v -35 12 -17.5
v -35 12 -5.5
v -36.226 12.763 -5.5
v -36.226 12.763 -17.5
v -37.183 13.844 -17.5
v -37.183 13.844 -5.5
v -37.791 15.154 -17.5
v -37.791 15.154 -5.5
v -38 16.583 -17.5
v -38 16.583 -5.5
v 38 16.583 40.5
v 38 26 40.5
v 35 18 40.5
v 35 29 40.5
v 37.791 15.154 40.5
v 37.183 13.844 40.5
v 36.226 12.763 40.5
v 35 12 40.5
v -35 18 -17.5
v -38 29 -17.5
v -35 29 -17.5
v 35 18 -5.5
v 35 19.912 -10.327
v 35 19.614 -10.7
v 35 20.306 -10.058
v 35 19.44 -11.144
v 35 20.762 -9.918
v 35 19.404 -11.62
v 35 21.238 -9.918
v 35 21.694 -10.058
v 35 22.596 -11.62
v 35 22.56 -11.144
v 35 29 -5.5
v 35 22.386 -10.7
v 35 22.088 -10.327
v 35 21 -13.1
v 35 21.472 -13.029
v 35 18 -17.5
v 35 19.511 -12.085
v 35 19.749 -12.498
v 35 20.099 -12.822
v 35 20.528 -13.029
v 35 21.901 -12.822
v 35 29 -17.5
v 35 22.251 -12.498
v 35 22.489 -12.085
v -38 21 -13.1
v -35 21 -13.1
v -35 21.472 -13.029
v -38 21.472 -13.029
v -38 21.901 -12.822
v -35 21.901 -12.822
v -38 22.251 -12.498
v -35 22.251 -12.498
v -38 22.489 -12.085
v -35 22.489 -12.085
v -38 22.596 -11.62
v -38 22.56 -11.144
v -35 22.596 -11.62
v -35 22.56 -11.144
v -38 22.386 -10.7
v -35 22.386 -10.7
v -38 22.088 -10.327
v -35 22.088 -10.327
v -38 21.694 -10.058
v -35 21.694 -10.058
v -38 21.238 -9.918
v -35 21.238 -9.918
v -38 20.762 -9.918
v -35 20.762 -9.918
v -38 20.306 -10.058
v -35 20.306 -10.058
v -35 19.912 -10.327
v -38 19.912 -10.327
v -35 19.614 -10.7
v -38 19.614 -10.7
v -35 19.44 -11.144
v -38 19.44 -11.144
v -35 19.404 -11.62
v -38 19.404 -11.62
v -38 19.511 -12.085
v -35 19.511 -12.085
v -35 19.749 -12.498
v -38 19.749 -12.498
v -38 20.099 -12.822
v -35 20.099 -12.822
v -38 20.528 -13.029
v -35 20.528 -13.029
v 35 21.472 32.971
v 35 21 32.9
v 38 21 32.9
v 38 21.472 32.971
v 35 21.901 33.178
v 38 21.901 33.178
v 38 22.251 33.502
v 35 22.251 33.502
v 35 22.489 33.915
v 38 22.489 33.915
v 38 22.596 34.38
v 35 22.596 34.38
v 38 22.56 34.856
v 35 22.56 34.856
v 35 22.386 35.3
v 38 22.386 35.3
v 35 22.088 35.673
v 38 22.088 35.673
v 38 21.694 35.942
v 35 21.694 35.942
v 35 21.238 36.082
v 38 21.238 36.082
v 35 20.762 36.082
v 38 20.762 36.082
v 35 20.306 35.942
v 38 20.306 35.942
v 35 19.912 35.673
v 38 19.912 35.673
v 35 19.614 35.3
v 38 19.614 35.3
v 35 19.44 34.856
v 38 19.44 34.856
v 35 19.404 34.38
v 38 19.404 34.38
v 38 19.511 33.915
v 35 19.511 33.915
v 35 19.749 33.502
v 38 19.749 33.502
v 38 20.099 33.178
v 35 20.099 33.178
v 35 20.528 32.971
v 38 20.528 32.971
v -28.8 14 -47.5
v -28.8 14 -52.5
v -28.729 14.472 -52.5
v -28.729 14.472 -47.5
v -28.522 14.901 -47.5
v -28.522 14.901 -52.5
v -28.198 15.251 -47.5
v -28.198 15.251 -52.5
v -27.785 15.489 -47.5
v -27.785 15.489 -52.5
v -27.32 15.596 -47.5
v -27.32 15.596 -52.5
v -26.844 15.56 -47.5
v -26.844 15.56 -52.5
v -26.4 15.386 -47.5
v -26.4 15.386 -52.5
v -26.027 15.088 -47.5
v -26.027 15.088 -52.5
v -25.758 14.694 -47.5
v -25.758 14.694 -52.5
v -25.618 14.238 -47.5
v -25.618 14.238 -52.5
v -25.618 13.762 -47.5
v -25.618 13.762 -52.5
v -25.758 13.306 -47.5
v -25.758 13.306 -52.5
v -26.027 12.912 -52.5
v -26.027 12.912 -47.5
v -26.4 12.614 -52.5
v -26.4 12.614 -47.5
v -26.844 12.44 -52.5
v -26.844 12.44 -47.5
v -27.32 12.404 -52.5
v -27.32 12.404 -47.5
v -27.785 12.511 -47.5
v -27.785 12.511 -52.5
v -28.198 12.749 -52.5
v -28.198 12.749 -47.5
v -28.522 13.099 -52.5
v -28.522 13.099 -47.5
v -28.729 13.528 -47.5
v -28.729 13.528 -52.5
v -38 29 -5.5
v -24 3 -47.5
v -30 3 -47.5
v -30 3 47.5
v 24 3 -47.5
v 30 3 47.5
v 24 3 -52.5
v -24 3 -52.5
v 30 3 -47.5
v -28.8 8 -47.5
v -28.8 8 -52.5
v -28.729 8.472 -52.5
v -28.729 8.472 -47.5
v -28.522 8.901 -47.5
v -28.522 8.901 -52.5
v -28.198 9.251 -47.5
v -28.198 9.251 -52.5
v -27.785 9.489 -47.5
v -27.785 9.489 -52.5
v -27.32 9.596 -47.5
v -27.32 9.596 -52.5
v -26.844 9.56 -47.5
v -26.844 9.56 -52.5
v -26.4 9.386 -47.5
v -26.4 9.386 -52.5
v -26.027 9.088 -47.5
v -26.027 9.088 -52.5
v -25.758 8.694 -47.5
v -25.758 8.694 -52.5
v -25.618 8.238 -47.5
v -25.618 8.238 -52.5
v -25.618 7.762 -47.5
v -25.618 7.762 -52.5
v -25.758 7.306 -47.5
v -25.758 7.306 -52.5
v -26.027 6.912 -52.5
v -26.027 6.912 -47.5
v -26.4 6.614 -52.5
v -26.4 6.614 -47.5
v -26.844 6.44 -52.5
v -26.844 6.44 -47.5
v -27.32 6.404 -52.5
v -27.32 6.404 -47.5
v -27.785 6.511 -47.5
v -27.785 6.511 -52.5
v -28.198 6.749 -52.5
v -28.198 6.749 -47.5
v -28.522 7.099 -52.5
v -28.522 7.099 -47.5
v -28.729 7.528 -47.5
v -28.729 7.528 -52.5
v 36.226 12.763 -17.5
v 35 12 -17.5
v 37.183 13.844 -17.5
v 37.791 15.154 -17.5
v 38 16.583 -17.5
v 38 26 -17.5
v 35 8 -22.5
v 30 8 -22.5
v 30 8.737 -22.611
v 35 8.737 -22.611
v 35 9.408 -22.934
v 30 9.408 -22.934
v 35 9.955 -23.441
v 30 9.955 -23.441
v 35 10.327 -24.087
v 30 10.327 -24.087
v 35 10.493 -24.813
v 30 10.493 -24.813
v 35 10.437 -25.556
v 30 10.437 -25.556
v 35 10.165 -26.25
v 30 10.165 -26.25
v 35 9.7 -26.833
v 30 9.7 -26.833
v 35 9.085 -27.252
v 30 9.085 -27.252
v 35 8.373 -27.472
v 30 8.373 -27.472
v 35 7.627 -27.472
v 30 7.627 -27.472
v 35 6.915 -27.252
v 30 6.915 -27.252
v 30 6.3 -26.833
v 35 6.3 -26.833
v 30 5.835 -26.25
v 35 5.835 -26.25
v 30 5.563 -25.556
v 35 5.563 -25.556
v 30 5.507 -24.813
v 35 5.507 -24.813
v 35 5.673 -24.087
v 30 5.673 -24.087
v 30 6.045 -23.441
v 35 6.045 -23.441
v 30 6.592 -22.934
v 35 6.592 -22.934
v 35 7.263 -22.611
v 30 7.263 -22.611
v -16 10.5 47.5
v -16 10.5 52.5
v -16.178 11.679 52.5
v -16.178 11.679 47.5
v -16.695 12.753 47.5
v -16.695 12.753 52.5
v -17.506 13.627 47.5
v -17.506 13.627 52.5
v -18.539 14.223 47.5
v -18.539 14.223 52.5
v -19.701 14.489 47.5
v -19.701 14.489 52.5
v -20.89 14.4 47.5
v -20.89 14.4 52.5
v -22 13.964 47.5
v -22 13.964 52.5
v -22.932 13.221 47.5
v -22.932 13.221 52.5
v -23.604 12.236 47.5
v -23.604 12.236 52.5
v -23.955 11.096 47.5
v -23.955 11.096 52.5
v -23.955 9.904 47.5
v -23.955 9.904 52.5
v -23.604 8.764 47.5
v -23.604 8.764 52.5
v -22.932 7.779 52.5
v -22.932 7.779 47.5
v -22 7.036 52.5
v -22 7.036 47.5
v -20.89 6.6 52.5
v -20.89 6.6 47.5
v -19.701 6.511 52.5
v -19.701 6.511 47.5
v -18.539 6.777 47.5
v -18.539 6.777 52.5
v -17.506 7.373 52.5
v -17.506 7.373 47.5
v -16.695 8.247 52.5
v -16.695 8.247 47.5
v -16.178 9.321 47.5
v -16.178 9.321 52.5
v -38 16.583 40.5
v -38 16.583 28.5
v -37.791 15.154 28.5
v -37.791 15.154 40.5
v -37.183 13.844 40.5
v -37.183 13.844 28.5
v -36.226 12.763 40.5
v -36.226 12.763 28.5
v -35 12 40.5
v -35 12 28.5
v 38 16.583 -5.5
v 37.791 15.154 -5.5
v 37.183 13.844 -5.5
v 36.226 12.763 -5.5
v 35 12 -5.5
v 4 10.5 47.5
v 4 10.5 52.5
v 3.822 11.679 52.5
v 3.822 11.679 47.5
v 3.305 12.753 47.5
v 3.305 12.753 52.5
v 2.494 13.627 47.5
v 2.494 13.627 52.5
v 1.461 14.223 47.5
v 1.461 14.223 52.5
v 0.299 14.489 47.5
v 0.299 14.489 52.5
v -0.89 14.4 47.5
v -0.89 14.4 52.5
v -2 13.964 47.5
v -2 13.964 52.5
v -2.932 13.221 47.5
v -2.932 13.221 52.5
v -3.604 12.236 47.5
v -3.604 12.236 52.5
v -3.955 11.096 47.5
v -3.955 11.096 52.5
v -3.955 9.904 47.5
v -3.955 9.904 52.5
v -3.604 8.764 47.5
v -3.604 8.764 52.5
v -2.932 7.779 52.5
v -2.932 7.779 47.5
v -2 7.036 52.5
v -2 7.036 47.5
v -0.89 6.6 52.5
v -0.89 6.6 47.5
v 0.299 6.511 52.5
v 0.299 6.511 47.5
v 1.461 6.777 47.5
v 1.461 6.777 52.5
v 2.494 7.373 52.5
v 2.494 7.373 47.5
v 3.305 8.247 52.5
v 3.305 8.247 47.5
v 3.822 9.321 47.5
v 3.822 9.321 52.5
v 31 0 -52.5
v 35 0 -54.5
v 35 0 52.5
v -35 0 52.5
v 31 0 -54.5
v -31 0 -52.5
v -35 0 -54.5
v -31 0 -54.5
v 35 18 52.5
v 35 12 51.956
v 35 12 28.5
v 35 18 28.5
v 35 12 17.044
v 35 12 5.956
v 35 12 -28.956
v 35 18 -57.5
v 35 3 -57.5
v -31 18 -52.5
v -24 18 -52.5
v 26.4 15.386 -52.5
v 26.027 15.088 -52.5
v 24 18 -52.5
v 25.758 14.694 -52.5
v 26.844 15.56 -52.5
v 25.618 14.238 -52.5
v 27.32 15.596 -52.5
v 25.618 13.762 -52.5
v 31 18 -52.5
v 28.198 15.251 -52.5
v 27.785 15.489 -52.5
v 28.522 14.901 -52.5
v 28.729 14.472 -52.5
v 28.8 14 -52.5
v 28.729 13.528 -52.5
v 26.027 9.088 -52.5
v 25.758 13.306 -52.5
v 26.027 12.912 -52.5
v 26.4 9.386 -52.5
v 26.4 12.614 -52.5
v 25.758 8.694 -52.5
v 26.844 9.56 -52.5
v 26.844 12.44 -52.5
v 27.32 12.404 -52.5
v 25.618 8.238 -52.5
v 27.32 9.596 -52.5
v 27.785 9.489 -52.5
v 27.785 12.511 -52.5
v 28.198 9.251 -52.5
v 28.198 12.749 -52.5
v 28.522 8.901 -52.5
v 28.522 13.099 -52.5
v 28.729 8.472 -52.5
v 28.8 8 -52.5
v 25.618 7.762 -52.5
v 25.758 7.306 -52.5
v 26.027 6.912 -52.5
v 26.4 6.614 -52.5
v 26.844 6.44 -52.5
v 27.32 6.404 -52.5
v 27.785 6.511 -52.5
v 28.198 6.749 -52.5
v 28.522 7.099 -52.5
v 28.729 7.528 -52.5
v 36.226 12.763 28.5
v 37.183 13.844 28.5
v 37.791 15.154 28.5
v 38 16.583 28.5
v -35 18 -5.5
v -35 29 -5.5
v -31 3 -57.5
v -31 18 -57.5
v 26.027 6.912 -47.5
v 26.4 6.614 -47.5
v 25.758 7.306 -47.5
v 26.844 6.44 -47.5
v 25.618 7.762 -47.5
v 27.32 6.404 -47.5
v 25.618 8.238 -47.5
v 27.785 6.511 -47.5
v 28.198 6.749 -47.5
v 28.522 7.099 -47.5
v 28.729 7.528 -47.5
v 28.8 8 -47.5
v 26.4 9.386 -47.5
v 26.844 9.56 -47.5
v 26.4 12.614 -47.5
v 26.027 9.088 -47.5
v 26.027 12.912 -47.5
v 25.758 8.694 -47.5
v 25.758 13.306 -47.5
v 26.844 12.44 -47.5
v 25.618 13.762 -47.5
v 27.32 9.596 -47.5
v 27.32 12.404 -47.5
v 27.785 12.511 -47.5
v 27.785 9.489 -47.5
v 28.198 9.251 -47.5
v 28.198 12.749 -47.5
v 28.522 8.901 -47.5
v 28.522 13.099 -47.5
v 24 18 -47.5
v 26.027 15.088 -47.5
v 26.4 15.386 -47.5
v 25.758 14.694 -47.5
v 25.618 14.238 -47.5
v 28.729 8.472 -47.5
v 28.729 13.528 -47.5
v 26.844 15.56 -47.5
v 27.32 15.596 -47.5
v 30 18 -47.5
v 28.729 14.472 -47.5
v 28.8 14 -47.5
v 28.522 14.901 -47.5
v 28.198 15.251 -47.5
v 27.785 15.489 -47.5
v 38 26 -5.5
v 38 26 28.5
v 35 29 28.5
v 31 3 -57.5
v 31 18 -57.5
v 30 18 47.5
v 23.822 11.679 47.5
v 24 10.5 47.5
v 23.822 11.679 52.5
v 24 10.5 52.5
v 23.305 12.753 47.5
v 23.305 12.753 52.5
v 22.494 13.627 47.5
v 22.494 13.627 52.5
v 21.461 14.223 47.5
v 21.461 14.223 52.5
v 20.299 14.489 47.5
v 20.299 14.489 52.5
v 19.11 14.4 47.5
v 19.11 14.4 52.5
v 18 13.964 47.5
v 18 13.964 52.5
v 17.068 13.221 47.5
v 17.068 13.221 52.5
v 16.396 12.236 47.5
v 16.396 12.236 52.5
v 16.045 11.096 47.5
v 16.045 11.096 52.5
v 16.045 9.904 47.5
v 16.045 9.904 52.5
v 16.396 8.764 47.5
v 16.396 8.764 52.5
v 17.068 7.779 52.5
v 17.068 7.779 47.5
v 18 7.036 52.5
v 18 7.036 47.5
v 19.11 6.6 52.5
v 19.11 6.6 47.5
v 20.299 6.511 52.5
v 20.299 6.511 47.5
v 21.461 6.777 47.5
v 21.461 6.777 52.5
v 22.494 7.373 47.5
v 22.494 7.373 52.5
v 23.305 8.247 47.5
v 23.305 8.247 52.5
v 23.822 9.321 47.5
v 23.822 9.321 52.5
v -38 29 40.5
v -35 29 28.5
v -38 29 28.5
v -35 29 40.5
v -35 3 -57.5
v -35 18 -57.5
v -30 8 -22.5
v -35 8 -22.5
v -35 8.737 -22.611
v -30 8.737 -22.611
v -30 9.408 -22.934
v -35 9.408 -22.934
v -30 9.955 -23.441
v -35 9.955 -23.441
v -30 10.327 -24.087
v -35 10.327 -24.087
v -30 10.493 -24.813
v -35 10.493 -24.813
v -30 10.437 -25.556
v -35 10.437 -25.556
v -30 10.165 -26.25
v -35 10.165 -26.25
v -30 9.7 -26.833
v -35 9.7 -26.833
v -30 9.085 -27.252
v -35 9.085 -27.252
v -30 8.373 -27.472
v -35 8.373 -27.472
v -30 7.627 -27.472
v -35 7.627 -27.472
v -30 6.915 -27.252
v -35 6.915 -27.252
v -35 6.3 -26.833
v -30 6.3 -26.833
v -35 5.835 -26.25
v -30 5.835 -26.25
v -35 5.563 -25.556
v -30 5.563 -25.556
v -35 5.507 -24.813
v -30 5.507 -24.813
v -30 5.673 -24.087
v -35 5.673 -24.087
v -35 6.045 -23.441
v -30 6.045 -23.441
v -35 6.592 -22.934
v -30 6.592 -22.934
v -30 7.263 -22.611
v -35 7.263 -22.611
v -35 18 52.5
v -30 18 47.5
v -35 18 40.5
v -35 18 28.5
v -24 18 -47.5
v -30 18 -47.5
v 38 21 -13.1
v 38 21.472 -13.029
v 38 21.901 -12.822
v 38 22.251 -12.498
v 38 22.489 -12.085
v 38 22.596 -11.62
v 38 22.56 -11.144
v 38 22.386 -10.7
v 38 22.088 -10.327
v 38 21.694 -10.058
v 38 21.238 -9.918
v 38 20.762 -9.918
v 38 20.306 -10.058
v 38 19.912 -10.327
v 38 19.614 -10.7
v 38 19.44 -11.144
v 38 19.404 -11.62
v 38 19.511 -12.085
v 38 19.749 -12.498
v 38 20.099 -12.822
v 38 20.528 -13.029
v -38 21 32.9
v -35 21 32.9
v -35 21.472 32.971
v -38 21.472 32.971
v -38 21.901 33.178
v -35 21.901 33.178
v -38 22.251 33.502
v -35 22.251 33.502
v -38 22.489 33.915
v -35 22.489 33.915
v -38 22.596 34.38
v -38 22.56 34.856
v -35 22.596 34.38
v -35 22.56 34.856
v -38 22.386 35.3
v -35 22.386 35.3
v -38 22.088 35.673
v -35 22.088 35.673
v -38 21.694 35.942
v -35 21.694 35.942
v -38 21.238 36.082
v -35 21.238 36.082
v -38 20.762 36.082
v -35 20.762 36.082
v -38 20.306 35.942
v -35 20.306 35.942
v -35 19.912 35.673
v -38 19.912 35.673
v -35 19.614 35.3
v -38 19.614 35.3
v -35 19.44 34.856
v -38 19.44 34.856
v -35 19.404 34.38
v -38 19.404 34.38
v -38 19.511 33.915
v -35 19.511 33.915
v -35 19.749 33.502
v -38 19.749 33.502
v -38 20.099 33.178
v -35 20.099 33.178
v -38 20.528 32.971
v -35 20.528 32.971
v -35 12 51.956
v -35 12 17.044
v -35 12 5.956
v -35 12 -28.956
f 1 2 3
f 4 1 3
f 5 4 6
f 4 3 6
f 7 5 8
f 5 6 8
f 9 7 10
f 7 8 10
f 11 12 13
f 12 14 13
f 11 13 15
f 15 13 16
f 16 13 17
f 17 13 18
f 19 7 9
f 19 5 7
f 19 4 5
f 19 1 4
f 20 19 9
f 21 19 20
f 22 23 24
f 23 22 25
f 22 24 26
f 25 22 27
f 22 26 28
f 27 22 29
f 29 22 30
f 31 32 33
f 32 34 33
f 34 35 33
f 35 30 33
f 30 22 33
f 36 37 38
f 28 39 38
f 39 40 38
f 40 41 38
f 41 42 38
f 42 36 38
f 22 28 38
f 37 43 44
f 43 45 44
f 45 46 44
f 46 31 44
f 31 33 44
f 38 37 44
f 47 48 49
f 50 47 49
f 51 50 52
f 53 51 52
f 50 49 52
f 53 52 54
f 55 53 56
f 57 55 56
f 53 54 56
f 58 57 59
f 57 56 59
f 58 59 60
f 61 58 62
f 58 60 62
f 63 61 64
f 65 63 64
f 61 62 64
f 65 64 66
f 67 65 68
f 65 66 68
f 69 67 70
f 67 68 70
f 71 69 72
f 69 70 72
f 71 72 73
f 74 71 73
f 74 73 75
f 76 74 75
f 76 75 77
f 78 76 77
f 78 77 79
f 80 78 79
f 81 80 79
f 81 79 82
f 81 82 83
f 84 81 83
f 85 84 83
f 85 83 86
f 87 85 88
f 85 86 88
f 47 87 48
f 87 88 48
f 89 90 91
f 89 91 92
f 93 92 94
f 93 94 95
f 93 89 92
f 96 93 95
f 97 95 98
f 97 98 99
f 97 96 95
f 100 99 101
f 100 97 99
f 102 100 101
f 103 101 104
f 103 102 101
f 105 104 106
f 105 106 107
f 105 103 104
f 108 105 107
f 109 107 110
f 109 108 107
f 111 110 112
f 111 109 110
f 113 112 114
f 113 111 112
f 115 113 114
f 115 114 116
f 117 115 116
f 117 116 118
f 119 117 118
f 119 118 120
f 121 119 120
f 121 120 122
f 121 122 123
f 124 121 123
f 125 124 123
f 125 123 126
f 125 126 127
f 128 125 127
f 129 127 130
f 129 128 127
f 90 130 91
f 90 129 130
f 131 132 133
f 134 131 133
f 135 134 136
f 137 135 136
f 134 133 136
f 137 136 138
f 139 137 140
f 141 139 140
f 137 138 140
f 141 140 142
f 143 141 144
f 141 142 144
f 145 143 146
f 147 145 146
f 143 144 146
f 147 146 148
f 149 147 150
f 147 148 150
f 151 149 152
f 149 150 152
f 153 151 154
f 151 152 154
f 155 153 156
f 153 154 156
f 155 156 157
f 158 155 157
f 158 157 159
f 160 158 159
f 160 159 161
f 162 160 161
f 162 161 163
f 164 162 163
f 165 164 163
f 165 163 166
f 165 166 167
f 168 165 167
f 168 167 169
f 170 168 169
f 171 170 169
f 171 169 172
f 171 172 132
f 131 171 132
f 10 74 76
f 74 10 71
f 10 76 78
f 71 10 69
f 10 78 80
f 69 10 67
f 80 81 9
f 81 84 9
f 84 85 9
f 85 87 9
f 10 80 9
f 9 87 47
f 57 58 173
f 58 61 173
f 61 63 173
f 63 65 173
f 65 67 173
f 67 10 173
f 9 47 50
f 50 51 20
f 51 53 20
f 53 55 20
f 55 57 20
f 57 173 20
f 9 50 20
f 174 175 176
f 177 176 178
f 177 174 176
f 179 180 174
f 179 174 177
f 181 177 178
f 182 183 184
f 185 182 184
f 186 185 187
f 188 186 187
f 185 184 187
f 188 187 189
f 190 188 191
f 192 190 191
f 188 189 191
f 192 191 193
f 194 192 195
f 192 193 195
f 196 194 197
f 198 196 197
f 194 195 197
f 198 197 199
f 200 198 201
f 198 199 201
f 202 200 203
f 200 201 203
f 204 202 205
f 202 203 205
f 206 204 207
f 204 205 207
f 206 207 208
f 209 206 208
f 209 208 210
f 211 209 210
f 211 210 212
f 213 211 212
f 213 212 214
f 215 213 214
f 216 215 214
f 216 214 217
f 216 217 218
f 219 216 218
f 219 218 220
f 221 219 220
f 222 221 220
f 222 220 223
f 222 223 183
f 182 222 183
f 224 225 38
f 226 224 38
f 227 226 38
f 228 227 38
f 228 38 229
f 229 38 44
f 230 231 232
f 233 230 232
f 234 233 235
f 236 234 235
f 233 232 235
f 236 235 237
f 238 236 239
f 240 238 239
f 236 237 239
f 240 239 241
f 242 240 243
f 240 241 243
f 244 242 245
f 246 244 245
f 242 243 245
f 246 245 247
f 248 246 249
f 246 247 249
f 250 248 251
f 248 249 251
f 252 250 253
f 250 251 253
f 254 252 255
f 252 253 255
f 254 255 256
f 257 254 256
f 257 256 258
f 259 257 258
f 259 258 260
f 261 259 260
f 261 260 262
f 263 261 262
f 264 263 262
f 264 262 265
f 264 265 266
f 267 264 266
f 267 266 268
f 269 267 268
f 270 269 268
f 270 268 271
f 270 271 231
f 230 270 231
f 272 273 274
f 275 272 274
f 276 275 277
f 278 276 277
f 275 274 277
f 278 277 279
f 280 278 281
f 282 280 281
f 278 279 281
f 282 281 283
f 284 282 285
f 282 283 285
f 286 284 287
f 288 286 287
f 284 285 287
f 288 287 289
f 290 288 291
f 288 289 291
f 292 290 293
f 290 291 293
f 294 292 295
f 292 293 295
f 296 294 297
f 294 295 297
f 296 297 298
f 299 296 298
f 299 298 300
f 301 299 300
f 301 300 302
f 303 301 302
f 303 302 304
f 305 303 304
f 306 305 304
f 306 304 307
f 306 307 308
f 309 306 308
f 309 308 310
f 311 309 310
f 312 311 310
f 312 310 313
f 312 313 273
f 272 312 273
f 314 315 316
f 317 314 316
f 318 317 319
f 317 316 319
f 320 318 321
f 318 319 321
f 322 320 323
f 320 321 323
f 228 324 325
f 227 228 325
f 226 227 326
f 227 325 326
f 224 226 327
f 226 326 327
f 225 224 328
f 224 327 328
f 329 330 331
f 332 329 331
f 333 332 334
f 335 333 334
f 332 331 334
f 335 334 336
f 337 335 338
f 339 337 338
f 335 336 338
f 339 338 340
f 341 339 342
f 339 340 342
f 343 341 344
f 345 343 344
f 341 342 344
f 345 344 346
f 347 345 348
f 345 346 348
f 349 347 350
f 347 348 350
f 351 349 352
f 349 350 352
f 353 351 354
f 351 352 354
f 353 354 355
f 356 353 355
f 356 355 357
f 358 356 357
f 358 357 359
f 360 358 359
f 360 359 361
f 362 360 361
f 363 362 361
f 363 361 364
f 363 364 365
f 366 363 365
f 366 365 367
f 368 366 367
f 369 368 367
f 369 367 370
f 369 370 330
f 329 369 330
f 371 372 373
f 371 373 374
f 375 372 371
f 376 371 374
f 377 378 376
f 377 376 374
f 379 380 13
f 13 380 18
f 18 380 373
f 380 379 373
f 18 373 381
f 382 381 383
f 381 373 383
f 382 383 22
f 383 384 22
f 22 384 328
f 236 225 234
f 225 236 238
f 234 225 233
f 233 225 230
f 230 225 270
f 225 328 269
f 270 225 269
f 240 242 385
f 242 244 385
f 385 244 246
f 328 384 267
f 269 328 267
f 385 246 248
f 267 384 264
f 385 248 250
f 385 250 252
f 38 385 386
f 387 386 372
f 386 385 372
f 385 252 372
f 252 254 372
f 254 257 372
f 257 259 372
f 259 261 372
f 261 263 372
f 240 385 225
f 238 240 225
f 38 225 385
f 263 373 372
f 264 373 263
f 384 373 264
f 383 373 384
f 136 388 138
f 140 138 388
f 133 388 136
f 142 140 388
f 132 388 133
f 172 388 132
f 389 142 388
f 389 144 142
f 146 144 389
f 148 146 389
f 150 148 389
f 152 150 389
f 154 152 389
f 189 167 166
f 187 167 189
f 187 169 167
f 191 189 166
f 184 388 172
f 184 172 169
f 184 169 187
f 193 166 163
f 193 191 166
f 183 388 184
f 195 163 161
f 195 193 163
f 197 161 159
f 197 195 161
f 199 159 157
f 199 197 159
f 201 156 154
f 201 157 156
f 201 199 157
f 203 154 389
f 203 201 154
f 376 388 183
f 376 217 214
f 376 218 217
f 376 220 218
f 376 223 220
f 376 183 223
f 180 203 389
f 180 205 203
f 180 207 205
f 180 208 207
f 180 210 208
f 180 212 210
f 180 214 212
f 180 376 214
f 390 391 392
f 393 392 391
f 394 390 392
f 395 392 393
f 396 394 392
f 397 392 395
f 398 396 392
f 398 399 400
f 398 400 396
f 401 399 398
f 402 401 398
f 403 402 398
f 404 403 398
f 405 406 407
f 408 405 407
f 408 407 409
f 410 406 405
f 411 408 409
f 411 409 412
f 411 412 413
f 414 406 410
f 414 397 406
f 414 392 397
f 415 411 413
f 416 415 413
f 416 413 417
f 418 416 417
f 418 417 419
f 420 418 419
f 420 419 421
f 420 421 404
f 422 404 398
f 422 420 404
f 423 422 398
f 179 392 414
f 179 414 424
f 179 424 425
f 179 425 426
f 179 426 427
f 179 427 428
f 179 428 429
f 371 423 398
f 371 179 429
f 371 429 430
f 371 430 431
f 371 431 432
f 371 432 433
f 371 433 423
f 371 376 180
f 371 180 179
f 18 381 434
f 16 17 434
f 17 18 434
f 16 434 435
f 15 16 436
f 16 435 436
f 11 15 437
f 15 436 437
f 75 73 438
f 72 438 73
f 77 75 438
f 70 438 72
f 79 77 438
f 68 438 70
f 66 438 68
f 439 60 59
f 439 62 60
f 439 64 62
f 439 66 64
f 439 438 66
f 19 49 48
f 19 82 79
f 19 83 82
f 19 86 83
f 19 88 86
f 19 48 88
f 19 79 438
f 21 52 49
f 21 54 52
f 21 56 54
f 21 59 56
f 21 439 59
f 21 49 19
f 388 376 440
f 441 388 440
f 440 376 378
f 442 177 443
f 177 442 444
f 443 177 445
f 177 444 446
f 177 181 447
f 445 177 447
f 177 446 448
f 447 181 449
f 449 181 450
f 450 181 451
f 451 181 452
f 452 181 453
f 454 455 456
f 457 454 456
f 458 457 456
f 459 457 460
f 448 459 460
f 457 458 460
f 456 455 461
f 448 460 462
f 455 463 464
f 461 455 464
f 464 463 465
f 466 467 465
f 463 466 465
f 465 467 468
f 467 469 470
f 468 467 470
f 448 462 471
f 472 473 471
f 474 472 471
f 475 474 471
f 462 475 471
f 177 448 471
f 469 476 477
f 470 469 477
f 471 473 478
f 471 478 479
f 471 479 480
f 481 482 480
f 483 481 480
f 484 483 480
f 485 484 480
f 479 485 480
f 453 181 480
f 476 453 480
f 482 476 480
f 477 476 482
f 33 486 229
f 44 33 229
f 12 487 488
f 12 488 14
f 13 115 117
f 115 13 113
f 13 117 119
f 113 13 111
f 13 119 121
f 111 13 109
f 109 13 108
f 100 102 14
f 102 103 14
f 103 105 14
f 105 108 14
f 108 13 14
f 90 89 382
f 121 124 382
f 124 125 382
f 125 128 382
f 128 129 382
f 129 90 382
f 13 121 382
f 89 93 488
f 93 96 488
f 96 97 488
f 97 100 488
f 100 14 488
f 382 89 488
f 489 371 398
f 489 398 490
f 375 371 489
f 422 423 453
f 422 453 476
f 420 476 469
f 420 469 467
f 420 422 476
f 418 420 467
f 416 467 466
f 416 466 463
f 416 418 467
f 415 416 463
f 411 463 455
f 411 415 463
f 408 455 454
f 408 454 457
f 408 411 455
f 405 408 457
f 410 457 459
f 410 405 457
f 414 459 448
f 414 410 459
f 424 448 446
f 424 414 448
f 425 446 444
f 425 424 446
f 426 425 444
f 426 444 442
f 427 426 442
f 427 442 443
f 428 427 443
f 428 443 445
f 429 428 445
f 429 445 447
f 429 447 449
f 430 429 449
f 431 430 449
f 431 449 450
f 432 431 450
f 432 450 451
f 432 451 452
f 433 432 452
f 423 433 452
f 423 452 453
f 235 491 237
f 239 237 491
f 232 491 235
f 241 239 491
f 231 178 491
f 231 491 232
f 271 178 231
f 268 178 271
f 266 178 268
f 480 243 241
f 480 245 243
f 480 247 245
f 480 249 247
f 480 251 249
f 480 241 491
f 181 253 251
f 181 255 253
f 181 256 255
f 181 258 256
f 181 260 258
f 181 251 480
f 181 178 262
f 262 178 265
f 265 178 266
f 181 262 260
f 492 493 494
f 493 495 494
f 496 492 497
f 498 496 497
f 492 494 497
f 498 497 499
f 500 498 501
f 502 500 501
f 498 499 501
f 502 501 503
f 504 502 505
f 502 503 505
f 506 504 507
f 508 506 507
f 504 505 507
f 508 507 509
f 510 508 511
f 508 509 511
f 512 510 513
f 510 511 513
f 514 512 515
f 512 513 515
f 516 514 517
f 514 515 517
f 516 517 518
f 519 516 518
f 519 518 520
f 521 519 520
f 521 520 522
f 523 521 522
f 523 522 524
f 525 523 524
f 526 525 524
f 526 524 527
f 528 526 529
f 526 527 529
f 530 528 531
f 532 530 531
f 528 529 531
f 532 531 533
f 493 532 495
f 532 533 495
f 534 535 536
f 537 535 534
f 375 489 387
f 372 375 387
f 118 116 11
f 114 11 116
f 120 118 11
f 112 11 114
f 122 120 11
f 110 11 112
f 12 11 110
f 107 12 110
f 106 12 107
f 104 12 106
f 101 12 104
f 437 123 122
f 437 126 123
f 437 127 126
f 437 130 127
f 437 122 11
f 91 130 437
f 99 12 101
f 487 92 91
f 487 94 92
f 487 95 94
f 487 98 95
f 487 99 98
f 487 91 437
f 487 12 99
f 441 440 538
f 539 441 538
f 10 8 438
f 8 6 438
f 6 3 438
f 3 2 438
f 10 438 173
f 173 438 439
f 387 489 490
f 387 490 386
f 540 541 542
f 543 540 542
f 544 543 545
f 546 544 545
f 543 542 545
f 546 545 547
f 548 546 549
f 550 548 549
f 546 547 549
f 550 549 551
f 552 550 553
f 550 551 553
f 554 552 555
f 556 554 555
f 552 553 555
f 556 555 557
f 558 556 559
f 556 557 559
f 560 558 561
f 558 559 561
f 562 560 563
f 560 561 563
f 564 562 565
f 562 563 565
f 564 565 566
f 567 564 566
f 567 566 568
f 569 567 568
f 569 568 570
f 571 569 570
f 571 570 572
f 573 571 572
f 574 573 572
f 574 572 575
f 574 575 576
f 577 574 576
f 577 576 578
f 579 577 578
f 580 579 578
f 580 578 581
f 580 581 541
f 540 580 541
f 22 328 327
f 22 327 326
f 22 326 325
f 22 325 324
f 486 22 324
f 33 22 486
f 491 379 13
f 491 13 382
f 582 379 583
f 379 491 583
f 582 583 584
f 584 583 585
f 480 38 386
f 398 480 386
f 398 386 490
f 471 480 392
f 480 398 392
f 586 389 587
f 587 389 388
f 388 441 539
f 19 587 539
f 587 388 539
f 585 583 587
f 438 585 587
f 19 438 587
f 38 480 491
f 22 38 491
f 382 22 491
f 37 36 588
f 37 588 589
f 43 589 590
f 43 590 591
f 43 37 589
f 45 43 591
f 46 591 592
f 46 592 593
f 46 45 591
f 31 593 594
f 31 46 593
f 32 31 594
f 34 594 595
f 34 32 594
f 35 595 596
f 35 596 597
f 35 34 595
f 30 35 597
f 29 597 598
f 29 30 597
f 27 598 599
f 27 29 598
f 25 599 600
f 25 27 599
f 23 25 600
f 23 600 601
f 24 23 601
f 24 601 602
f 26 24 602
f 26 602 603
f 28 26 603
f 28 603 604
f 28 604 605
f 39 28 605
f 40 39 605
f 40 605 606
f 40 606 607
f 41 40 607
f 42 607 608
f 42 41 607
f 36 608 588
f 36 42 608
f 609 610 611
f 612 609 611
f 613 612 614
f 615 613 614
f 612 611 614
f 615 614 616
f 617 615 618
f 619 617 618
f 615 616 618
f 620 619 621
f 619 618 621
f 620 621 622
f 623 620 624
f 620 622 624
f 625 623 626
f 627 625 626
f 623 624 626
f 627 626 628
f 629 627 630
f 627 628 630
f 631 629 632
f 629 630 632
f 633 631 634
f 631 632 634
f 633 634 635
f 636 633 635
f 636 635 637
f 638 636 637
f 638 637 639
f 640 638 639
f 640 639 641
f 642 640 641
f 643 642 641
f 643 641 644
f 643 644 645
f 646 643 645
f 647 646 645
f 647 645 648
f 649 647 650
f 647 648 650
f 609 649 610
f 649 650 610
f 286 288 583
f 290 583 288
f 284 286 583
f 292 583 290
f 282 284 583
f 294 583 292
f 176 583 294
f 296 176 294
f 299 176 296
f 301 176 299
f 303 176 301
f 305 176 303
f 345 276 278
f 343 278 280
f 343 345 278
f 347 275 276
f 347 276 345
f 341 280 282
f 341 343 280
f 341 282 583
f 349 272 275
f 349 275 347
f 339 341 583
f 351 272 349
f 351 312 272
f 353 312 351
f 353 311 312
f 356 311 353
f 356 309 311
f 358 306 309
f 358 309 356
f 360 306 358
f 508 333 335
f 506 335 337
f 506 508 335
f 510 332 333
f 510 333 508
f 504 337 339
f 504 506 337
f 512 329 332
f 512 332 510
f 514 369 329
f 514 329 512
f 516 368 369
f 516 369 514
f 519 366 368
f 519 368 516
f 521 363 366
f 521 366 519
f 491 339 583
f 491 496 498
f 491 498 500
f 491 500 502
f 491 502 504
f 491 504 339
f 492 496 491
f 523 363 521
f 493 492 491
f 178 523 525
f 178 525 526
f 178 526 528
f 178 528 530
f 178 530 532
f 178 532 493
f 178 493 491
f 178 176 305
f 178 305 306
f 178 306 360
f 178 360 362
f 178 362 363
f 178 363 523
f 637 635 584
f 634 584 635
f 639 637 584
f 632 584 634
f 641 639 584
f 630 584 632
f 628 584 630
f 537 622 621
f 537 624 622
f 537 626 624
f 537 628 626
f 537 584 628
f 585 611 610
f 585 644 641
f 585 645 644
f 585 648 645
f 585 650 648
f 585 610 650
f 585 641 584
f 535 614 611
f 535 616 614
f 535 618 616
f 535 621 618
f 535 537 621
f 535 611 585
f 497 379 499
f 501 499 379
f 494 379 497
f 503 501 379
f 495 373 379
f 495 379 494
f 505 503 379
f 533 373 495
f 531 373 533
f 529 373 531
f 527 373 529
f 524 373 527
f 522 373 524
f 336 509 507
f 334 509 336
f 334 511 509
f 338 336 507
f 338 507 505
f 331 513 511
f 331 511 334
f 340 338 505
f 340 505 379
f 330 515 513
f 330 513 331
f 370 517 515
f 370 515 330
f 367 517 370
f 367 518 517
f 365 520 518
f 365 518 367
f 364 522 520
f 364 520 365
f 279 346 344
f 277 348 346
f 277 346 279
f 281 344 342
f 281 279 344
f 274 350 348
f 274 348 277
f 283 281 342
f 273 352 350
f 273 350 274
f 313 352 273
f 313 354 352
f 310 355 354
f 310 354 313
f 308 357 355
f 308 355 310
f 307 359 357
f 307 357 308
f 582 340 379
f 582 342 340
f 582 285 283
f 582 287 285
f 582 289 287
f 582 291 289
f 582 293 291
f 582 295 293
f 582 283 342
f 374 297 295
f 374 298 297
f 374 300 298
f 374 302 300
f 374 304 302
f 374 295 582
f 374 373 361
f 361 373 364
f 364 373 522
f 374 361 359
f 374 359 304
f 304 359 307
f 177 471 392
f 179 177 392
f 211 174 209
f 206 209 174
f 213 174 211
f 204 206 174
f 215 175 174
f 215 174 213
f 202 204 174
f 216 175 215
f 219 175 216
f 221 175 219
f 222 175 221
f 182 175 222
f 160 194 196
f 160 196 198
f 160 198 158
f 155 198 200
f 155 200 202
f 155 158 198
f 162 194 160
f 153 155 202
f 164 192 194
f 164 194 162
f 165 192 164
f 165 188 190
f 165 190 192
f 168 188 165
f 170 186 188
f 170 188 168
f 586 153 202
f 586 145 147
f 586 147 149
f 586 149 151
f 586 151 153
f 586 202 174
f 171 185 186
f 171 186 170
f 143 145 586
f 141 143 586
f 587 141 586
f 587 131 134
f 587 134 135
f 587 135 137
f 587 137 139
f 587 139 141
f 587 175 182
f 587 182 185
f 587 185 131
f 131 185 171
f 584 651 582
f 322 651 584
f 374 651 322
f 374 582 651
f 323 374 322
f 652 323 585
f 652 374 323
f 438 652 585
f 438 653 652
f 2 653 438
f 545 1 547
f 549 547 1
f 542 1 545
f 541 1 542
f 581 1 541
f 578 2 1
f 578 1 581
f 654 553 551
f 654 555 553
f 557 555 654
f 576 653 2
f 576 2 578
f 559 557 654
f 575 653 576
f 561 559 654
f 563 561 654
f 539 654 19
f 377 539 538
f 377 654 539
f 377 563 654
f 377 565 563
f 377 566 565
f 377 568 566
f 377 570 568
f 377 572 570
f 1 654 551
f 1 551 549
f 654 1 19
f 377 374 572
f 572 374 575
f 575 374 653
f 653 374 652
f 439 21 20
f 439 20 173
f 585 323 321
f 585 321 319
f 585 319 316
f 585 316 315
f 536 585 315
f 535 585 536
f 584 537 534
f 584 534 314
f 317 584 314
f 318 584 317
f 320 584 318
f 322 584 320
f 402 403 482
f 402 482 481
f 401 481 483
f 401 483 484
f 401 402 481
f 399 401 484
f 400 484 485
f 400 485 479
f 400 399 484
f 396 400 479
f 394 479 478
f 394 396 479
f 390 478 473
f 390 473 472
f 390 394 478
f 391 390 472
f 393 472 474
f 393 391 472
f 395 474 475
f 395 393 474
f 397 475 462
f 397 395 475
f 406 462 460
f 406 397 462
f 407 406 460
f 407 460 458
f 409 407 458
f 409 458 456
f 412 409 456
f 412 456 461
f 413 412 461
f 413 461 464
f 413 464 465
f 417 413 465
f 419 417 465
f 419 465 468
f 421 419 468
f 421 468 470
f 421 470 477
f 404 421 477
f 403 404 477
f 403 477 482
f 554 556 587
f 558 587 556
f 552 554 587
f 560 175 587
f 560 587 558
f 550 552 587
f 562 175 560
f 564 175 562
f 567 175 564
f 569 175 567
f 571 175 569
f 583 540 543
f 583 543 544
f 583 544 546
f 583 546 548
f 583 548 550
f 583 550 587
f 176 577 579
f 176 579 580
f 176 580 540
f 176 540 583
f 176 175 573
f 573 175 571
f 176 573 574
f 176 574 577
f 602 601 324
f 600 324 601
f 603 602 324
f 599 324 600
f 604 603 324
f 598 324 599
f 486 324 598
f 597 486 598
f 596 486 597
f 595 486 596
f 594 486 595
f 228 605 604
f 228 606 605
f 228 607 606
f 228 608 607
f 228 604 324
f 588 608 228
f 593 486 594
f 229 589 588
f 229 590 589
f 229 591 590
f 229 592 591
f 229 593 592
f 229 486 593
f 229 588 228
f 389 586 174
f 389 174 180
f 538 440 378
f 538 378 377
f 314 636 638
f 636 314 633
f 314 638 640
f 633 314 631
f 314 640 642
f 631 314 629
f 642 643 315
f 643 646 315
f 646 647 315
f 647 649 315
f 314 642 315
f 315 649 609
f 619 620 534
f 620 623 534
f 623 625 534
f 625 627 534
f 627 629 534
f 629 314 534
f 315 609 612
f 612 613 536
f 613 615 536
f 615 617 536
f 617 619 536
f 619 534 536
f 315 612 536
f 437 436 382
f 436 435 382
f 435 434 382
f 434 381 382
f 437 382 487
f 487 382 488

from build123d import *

# Parameters (mm, degrees)
CROQUIS1_W               = 70
CROQUIS1_H               = 105
SALIENTE_EXTRUIR1_DEPTH  = 3
SALIENTE_EXTRUIR2_DEPTH  = 15
CROQUIS10_R              = 1.6
CROQUIS10_W              = 3
CROQUIS10_H              = 6
CROQUIS10_H_2            = 11
SALIENTE_EXTRUIR4_DEPTH  = 3
REDONDEO1_R              = 5
REDONDEO1_OF_SIMETR_A1_R = 5
CROQUIS12_W              = 5
CROQUIS12_H              = 15
SALIENTE_EXTRUIR5_DEPTH  = 6
CORTAR_EXTRUIR1_REACH    = 117.369
CROQUIS13_R              = 4
CORTAR_EXTRUIR2_REACH    = 117.369
CROQUIS14_R              = 1.6
CROQUIS16_R              = 2.5
CORTAR_EXTRUIR3_DEPTH    = 70
CROQUIS17_W              = 4
CROQUIS17_H              = 5
SALIENTE_EXTRUIR6_DEPTH  = 18
CHAFL_N1_SIZE            = 3
CHAFL_N2_SIZE            = 3


# Some blends are built 0.0001 mm under size
with BuildPart() as part:
    # Croquis1 → Saliente-Extruir1 (new body)
    with BuildSketch(Plane(origin=(0, 0, 0), x_dir=(1, 0, 0), z_dir=(0, 1, 0))):
        Rectangle(CROQUIS1_W, CROQUIS1_H)
    extrude(amount=SALIENTE_EXTRUIR1_DEPTH)

    # Croquis2 → Saliente-Extruir2 (add)
    with BuildSketch(Plane(origin=(0, 3, 0), x_dir=(1, 0, 0), z_dir=(0, 1, 0))):
        Polygon((-35, 52.5), (-30, 52.5), (-30, -47.5), (30, -47.5), (30, 52.5), (35, 52.5), (35, -52.5), (-35, -52.5), align=None)
    extrude(amount=SALIENTE_EXTRUIR2_DEPTH)

    # Croquis10 → Saliente-Extruir4 (add)
    # profile 1 of 6: a face of its own
    with BuildSketch(Plane(origin=(35, 0, 0), x_dir=(0, 0, -1), z_dir=(1, 0, 0))):
        Polygon((8.5, 29), (8.5, 18), (17.5, 18), (17.5, 29), (11.5, 29), align=None)
        with Locations((11.5, 21)):
            Circle(CROQUIS10_R, mode=Mode.SUBTRACT)
    # profile 2 of 6: a face of its own
    with BuildSketch(Plane(origin=(35, 0, 0), x_dir=(0, 0, -1), z_dir=(1, 0, 0))):
        Polygon((8.5, 18), (8.5, 12), (11.5, 12), (17.5, 12), (17.5, 18), align=None)
    # profile 3 of 6: a face of its own
    with BuildSketch(Plane(origin=(35, 0, 0), x_dir=(0, 0, -1), z_dir=(1, 0, 0))):
        with Locations((7, 15)):
            Rectangle(CROQUIS10_W, CROQUIS10_H)
    # profile 4 of 6: a face of its own
    with BuildSketch(Plane(origin=(35, 0, 0), x_dir=(0, 0, -1), z_dir=(1, 0, 0))):
        with Locations((7, 23.5)):
            Rectangle(CROQUIS10_W, CROQUIS10_H_2)
    # profile 5 of 6: a face of its own
    with BuildSketch(Plane(origin=(35, 0, 0), x_dir=(0, 0, -1), z_dir=(1, 0, 0))):
        Polygon((-40.5, 18), (-28.5, 18), (-28.5, 29), (-31.5, 29), (-34.5, 29), (-40.5, 29), align=None)
        with Locations((-34.5, 21)):
            Circle(CROQUIS10_R, mode=Mode.SUBTRACT)
    # profile 6 of 6: a face of its own
    with BuildSketch(Plane(origin=(35, 0, 0), x_dir=(0, 0, -1), z_dir=(1, 0, 0))):
        Polygon((-28.5, 12), (-28.5, 18), (-40.5, 18), (-40.5, 12), (-34.5, 12), (-31.5, 12), align=None)
    saliente_extruir4 = extrude(amount=SALIENTE_EXTRUIR4_DEPTH)

    # Redondeo1
    # the kernel refuses this fillet: 5 mm, written as the material it takes off along each edge
    with BuildSketch(Plane(origin=(38, 12, 5.956439237), x_dir=(-1, 0, 0), z_dir=(0, 0, -1))) as redondeo1_piece_1:
        with BuildLine():
            CenterArc((5, 4.582575695), REDONDEO1_R, 180, 66.421821522)
            Line((0, 4.582575695), (-0.1, 4.582575695))
            Line((-0.1, 4.582575695), (-0.1, 0))
            Line((-0.1, 0), (0, -0.1))
            ThreePointArc((0, -0.1), (1.5, -0.1), (2.96, -0.091651514))
            Line((2.96, -0.091651514), (3, 0))
        make_face()
    extrude(amount=34.912878475, mode=Mode.SUBTRACT)
    with BuildSketch(Plane(origin=(38, 12, 17.043560763), x_dir=(-1, 0, 0), z_dir=(0, 0, 1))) as redondeo1_piece_2:
        with BuildLine():
            CenterArc((5, -4.582575695), REDONDEO1_R, 113.578178478, 66.421821522)
            Line((0, -4.582575695), (-0.1, -4.582575695))
            Line((-0.1, -4.582575695), (-0.1, 0))
            Line((-0.1, 0), (0, 0.1))
            ThreePointArc((0, 0.1), (1.5, 0.1), (2.96, 0.091651514))
            Line((2.96, 0.091651514), (3, 0))
        make_face()
    extrude(amount=34.912878475, mode=Mode.SUBTRACT)

    # Simetría1: Saliente-Extruir4 across plane
    add(saliente_extruir4.mirror(Plane(origin=(0, 0, 0), x_dir=(0, 0, 1), z_dir=(1, 0, 0))))

    # Redondeo1 of Simetría1
    # the kernel refuses this fillet: 5 mm, written as the material it takes off along each edge
    with BuildSketch(Plane(origin=(-38, 12, 5.956439237), x_dir=(1, 0, 0), z_dir=(0, 0, -1))) as redondeo1_of_simetr_a1_piece_1:
        with BuildLine():
            CenterArc((5, -4.582575695), REDONDEO1_OF_SIMETR_A1_R, 113.578178478, 66.421821522)
            Line((0, -4.582575695), (-0.1, -4.582575695))
            Line((-0.1, -4.582575695), (-0.1, 0))
            Line((-0.1, 0), (0, 0.1))
            ThreePointArc((0, 0.1), (1.5, 0.1), (2.96, 0.091651514))
            Line((2.96, 0.091651514), (3, 0))
        make_face()
    extrude(amount=34.912878475, mode=Mode.SUBTRACT)
    with BuildSketch(Plane(origin=(-38, 12, 17.043560763), x_dir=(1, 0, 0), z_dir=(0, 0, 1))) as redondeo1_of_simetr_a1_piece_2:
        with BuildLine():
            CenterArc((5, 4.582575695), REDONDEO1_OF_SIMETR_A1_R, 180, 66.421821522)
            Line((0, 4.582575695), (-0.1, 4.582575695))
            Line((-0.1, 4.582575695), (-0.1, 0))
            Line((-0.1, 0), (0, -0.1))
            ThreePointArc((0, -0.1), (1.5, -0.1), (2.96, -0.091651514))
            Line((2.96, -0.091651514), (3, 0))
        make_face()
    extrude(amount=34.912878475, mode=Mode.SUBTRACT)

    # Croquis12 → Saliente-Extruir5 (add)
    with BuildSketch(Plane(origin=(-30, 0, 0), x_dir=(0, 0, -1), z_dir=(1, 0, 0))):
        with Locations((50, 10.5)):
            Rectangle(CROQUIS12_W, CROQUIS12_H)
    saliente_extruir5 = extrude(amount=SALIENTE_EXTRUIR5_DEPTH)

    # Simetría2: Saliente-Extruir5 across plane
    add(saliente_extruir5.mirror(Plane(origin=(0, 0, 0), x_dir=(0, 0, 1), z_dir=(1, 0, 0))))

    # Croquis13 → Cortar-Extruir1 (cut, up to next)
    with BuildSketch(Plane.XY.offset(52.5), mode=Mode.PRIVATE) as cortar_extruir1_sk1:
        with Locations((-20, 10.5)):
            Circle(CROQUIS13_R)
    cortar_extruir1_tool1 = extrude(cortar_extruir1_sk1.sketch, amount=-CORTAR_EXTRUIR1_REACH, mode=Mode.PRIVATE) & part.part
    # Croquis13 → Cortar-Extruir1 (cut, up to next)
    with BuildSketch(Plane.XY.offset(52.5), mode=Mode.PRIVATE) as cortar_extruir1_sk2:
        with Locations((0, 10.5)):
            Circle(CROQUIS13_R)
    cortar_extruir1_tool2 = extrude(cortar_extruir1_sk2.sketch, amount=-CORTAR_EXTRUIR1_REACH, mode=Mode.PRIVATE) & part.part
    # Croquis13 → Cortar-Extruir1 (cut, up to next)
    with BuildSketch(Plane.XY.offset(52.5), mode=Mode.PRIVATE) as cortar_extruir1_sk3:
        with Locations((20, 10.5)):
            Circle(CROQUIS13_R)
    cortar_extruir1_tool3 = extrude(cortar_extruir1_sk3.sketch, amount=-CORTAR_EXTRUIR1_REACH, mode=Mode.PRIVATE) & part.part
    add(cortar_extruir1_tool1.solids().sort_by_distance((-20, 10.5, 52.5))[0], mode=Mode.SUBTRACT)
    add(cortar_extruir1_tool2.solids().sort_by_distance((0, 10.5, 52.5))[0], mode=Mode.SUBTRACT)
    add(cortar_extruir1_tool3.solids().sort_by_distance((20, 10.5, 52.5))[0], mode=Mode.SUBTRACT)

    # Croquis14 → Cortar-Extruir2 (cut, up to next)
    with BuildSketch(Plane(origin=(0, 0, -52.5), x_dir=(-1, 0, 0), z_dir=(0, 0, -1)), mode=Mode.PRIVATE) as cortar_extruir2_sk1:
        with Locations((27.2, 14)):
            Circle(CROQUIS14_R)
    cortar_extruir2_tool1 = extrude(cortar_extruir2_sk1.sketch, amount=-CORTAR_EXTRUIR2_REACH, mode=Mode.PRIVATE) & part.part
    # Croquis14 → Cortar-Extruir2 (cut, up to next)
    with BuildSketch(Plane(origin=(0, 0, -52.5), x_dir=(-1, 0, 0), z_dir=(0, 0, -1)), mode=Mode.PRIVATE) as cortar_extruir2_sk2:
        with Locations((27.2, 8)):
            Circle(CROQUIS14_R)
    cortar_extruir2_tool2 = extrude(cortar_extruir2_sk2.sketch, amount=-CORTAR_EXTRUIR2_REACH, mode=Mode.PRIVATE) & part.part
    cortar_extruir2_1 = cortar_extruir2_tool1.solids().sort_by_distance((-27.2, 14, -52.5))[0]
    add(cortar_extruir2_1, mode=Mode.SUBTRACT)
    cortar_extruir2_2 = cortar_extruir2_tool2.solids().sort_by_distance((-27.2, 8, -52.5))[0]
    add(cortar_extruir2_2, mode=Mode.SUBTRACT)
    cortar_extruir2 = cortar_extruir2_1 + cortar_extruir2_2  # Cortar-Extruir2 as one shape, for the pattern or mirror that repeats it

    # Simetría3: Cortar-Extruir2 across plane
    add(cortar_extruir2.mirror(Plane(origin=(0, 0, 0), x_dir=(0, 0, 1), z_dir=(1, 0, 0))), mode=Mode.SUBTRACT)

    # Croquis16 → Cortar-Extruir3 (cut)
    with BuildSketch(Plane.ZY.offset(35)):
        with Locations((-25, 8)):
            Circle(CROQUIS16_R)
    extrude(amount=-CORTAR_EXTRUIR3_DEPTH, mode=Mode.SUBTRACT)

    # Croquis17 → Saliente-Extruir6 (add)
    with BuildSketch(Plane(origin=(0, 0, 0), x_dir=(1, 0, 0), z_dir=(0, 1, 0))):
        with Locations((33, 55)):
            Rectangle(CROQUIS17_W, CROQUIS17_H)
    saliente_extruir6 = extrude(amount=SALIENTE_EXTRUIR6_DEPTH)

    # Simetría4: Saliente-Extruir6 across plane
    add(saliente_extruir6.mirror(Plane(origin=(0, 0, 0), x_dir=(0, 0, 1), z_dir=(1, 0, 0))))

    # Chaflán1
    chafl_n1_edges = [part.edges().sort_by_distance(p)[0] for p in [
        (33, 0, -57.5),
        (-33, 0, -57.5),
    ]]
    chamfer(chafl_n1_edges, length=CHAFL_N1_SIZE)

    # Chaflán2
    chafl_n2_edges = [part.edges().sort_by_distance(p)[0] for p in [
        (38, 29, -11.5),
        (38, 29, 34.5),
    ]]
    chamfer(chafl_n2_edges, length=CHAFL_N2_SIZE - 0.0001)  # a hair under: the kernel refuses the full size


solid = part.part
